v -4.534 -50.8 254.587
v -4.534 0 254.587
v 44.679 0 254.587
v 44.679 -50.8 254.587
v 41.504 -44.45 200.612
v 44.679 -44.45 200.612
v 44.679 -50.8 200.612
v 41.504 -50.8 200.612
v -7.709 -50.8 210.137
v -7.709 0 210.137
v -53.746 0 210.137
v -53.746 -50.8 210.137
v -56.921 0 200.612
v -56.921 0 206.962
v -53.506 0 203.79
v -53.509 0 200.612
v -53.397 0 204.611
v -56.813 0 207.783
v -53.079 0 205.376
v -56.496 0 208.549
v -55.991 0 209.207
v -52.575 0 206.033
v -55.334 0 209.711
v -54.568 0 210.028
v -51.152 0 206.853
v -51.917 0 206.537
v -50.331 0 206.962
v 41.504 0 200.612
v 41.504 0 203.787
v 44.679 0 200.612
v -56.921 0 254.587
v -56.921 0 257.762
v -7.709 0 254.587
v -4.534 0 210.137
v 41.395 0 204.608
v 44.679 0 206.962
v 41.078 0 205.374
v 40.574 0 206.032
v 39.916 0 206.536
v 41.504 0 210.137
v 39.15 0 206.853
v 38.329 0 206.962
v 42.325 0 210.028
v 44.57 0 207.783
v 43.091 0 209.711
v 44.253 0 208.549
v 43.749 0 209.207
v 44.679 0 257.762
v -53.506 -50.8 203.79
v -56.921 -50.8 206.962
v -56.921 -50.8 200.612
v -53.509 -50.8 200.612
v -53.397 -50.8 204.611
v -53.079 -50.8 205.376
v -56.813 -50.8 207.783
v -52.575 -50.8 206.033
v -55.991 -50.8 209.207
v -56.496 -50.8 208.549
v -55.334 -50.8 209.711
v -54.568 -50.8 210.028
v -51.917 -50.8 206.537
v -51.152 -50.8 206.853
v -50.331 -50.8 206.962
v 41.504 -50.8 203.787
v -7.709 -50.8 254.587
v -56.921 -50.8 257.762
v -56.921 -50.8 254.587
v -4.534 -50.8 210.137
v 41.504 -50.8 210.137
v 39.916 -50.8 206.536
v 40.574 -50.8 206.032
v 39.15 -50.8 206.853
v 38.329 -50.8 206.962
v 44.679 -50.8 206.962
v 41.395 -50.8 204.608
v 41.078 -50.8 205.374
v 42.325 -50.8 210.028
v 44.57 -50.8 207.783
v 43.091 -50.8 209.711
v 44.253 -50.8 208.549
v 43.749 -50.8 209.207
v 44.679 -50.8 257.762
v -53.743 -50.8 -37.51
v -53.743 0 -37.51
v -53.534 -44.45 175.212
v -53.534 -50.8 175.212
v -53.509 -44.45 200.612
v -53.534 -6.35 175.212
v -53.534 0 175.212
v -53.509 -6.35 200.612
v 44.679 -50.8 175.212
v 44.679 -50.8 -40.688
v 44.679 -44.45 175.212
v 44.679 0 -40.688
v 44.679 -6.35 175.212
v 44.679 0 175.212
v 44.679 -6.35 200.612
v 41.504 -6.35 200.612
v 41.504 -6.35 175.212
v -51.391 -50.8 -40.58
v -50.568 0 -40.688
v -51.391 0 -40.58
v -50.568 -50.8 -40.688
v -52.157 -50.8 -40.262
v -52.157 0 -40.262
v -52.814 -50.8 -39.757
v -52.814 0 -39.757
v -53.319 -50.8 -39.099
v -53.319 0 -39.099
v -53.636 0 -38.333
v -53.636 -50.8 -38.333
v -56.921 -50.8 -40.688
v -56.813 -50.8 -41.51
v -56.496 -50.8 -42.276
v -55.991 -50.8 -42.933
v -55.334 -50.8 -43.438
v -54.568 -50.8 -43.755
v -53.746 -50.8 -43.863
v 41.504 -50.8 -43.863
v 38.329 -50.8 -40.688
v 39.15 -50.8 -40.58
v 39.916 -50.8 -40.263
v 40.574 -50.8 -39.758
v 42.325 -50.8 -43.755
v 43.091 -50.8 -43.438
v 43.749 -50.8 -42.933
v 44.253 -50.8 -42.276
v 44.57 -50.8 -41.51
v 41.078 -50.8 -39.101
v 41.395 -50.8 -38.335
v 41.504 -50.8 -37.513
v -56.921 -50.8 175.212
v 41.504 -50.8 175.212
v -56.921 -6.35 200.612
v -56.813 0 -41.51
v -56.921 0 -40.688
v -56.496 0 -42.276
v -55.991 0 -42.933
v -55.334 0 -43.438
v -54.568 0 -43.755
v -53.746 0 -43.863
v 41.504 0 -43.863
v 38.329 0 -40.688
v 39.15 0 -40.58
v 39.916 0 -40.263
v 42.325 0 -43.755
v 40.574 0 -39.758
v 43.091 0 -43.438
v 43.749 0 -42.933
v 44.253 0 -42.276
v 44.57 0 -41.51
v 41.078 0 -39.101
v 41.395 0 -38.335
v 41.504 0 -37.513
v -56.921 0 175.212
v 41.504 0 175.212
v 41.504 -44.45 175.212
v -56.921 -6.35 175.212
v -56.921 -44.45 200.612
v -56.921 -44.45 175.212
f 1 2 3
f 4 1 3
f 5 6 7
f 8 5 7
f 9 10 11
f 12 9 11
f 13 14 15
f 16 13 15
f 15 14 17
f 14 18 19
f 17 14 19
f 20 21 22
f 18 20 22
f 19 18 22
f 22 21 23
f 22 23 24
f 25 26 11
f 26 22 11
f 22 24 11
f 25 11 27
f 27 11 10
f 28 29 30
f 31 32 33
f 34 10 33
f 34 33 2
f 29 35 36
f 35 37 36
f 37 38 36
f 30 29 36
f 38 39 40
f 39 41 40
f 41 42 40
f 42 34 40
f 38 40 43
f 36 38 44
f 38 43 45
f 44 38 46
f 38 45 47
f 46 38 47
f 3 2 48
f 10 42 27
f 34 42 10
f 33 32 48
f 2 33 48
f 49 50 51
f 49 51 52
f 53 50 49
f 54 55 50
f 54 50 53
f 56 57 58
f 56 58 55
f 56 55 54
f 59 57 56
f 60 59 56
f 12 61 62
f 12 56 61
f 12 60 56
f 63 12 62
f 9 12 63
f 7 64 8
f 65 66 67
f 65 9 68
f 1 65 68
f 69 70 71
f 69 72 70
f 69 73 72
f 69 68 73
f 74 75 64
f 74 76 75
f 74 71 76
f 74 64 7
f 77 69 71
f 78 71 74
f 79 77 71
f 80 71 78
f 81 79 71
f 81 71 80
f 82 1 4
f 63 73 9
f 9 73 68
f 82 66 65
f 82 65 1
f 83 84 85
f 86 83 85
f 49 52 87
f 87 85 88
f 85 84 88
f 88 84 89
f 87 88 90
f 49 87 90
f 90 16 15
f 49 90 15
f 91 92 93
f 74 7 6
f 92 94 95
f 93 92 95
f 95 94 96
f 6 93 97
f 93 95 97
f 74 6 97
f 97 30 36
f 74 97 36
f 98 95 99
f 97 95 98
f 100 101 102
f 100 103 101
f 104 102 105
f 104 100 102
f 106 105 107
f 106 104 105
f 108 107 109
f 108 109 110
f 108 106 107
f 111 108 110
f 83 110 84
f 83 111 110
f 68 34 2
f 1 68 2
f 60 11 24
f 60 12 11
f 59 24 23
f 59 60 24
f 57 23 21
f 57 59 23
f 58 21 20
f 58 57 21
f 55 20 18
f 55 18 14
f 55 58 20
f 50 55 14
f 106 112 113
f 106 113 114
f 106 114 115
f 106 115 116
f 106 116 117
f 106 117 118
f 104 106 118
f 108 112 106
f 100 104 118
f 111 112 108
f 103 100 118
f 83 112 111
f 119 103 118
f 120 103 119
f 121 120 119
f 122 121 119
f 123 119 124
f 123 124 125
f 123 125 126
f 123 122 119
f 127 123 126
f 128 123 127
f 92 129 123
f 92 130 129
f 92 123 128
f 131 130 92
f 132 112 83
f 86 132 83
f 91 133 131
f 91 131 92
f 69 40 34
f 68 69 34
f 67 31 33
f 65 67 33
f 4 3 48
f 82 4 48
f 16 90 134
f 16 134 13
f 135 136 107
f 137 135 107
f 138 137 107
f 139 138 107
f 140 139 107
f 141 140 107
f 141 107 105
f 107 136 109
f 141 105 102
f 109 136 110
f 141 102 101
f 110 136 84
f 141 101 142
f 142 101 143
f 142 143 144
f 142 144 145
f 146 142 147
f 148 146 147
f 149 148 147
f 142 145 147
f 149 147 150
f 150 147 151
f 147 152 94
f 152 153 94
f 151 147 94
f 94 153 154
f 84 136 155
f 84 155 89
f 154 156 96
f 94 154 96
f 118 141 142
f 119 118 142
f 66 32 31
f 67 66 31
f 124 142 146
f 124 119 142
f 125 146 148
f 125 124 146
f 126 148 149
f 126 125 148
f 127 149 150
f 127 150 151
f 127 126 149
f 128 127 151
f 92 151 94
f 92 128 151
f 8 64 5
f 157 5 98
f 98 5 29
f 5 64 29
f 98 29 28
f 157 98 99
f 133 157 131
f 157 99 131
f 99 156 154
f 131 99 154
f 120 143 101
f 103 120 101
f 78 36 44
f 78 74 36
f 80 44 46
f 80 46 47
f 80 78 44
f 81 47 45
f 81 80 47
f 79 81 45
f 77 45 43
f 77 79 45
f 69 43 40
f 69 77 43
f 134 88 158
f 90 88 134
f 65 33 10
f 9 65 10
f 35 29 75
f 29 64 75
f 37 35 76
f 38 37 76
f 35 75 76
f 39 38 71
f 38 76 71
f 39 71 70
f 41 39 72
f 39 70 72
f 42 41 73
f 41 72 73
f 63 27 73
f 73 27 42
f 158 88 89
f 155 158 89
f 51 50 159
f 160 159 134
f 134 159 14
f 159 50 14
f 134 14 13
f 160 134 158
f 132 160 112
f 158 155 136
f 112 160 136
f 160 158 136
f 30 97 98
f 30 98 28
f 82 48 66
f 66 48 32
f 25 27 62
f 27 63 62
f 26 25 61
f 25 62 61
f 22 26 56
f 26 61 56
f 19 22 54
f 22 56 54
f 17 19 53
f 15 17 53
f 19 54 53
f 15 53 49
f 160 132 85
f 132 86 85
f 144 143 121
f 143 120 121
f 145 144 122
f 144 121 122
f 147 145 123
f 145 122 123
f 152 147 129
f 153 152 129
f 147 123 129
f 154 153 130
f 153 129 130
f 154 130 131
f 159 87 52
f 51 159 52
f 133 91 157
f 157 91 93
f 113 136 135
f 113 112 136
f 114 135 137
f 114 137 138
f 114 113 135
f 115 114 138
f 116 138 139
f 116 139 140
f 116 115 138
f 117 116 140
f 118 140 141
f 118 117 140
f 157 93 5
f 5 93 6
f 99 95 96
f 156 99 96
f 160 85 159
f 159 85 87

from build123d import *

# Parameters (mm, degrees)
F1_DEPTH = 50.8
F2_R     = 3.175
F3_W     = 19.05
F3_H     = 25.4
F3_W_2   = 6.35
F4_DEPTH = 127


with BuildPart() as f1:
    # F0 (on Front) → F1 (new body)
    with BuildSketch(Plane.XZ):
        Polygon((-7.708922, 210.136639), (-56.921422, 210.136639), (-56.921422, -43.863361), (44.678578, -43.863361), (44.678578, 210.136639), (-4.533922, 210.136639), (-4.533922, 254.586639), (44.678578, 254.586639), (44.678578, 257.761639), (-56.921422, 257.761639), (-56.921422, 254.586639), (-7.708922, 254.586639), align=None)
        Polygon((-53.746422, -40.688361), (-53.502657, 206.961519), (41.503578, 206.961519), (41.503578, -40.688361), align=None, mode=Mode.SUBTRACT)
    extrude(amount=F1_DEPTH)

    # F2
    f2_edges = [f1.edges().sort_by_distance(p)[0] for p in [
        (-56.921422, -25.4, 210.136639),
        (-53.502657, -25.4, 206.961519),
        (44.678578, -25.4, 210.136639),
        (41.503578, -25.4, 206.961519),
        (44.678578, -25.4, -43.863361),
        (41.503578, -25.4, -40.688361),
        (-56.921422, -25.4, -43.863361),
        (-53.746422, -25.4, -40.688361),
    ]]
    fillet(f2_edges, radius=F2_R)

    # F3 (on face) → F4 (cut)
    with BuildSketch(Plane.YZ.offset(44.678578)):
        with Locations((-60.325, 187.911639)):
            Rectangle(F3_W, F3_H)
        with Locations((-47.625, 187.911639)):
            Rectangle(F3_W_2, F3_H)
        with Locations((-3.175, 187.911639)):
            Rectangle(F3_W_2, F3_H)
    extrude(amount=-F4_DEPTH, mode=Mode.SUBTRACT)


solid = f1.part
